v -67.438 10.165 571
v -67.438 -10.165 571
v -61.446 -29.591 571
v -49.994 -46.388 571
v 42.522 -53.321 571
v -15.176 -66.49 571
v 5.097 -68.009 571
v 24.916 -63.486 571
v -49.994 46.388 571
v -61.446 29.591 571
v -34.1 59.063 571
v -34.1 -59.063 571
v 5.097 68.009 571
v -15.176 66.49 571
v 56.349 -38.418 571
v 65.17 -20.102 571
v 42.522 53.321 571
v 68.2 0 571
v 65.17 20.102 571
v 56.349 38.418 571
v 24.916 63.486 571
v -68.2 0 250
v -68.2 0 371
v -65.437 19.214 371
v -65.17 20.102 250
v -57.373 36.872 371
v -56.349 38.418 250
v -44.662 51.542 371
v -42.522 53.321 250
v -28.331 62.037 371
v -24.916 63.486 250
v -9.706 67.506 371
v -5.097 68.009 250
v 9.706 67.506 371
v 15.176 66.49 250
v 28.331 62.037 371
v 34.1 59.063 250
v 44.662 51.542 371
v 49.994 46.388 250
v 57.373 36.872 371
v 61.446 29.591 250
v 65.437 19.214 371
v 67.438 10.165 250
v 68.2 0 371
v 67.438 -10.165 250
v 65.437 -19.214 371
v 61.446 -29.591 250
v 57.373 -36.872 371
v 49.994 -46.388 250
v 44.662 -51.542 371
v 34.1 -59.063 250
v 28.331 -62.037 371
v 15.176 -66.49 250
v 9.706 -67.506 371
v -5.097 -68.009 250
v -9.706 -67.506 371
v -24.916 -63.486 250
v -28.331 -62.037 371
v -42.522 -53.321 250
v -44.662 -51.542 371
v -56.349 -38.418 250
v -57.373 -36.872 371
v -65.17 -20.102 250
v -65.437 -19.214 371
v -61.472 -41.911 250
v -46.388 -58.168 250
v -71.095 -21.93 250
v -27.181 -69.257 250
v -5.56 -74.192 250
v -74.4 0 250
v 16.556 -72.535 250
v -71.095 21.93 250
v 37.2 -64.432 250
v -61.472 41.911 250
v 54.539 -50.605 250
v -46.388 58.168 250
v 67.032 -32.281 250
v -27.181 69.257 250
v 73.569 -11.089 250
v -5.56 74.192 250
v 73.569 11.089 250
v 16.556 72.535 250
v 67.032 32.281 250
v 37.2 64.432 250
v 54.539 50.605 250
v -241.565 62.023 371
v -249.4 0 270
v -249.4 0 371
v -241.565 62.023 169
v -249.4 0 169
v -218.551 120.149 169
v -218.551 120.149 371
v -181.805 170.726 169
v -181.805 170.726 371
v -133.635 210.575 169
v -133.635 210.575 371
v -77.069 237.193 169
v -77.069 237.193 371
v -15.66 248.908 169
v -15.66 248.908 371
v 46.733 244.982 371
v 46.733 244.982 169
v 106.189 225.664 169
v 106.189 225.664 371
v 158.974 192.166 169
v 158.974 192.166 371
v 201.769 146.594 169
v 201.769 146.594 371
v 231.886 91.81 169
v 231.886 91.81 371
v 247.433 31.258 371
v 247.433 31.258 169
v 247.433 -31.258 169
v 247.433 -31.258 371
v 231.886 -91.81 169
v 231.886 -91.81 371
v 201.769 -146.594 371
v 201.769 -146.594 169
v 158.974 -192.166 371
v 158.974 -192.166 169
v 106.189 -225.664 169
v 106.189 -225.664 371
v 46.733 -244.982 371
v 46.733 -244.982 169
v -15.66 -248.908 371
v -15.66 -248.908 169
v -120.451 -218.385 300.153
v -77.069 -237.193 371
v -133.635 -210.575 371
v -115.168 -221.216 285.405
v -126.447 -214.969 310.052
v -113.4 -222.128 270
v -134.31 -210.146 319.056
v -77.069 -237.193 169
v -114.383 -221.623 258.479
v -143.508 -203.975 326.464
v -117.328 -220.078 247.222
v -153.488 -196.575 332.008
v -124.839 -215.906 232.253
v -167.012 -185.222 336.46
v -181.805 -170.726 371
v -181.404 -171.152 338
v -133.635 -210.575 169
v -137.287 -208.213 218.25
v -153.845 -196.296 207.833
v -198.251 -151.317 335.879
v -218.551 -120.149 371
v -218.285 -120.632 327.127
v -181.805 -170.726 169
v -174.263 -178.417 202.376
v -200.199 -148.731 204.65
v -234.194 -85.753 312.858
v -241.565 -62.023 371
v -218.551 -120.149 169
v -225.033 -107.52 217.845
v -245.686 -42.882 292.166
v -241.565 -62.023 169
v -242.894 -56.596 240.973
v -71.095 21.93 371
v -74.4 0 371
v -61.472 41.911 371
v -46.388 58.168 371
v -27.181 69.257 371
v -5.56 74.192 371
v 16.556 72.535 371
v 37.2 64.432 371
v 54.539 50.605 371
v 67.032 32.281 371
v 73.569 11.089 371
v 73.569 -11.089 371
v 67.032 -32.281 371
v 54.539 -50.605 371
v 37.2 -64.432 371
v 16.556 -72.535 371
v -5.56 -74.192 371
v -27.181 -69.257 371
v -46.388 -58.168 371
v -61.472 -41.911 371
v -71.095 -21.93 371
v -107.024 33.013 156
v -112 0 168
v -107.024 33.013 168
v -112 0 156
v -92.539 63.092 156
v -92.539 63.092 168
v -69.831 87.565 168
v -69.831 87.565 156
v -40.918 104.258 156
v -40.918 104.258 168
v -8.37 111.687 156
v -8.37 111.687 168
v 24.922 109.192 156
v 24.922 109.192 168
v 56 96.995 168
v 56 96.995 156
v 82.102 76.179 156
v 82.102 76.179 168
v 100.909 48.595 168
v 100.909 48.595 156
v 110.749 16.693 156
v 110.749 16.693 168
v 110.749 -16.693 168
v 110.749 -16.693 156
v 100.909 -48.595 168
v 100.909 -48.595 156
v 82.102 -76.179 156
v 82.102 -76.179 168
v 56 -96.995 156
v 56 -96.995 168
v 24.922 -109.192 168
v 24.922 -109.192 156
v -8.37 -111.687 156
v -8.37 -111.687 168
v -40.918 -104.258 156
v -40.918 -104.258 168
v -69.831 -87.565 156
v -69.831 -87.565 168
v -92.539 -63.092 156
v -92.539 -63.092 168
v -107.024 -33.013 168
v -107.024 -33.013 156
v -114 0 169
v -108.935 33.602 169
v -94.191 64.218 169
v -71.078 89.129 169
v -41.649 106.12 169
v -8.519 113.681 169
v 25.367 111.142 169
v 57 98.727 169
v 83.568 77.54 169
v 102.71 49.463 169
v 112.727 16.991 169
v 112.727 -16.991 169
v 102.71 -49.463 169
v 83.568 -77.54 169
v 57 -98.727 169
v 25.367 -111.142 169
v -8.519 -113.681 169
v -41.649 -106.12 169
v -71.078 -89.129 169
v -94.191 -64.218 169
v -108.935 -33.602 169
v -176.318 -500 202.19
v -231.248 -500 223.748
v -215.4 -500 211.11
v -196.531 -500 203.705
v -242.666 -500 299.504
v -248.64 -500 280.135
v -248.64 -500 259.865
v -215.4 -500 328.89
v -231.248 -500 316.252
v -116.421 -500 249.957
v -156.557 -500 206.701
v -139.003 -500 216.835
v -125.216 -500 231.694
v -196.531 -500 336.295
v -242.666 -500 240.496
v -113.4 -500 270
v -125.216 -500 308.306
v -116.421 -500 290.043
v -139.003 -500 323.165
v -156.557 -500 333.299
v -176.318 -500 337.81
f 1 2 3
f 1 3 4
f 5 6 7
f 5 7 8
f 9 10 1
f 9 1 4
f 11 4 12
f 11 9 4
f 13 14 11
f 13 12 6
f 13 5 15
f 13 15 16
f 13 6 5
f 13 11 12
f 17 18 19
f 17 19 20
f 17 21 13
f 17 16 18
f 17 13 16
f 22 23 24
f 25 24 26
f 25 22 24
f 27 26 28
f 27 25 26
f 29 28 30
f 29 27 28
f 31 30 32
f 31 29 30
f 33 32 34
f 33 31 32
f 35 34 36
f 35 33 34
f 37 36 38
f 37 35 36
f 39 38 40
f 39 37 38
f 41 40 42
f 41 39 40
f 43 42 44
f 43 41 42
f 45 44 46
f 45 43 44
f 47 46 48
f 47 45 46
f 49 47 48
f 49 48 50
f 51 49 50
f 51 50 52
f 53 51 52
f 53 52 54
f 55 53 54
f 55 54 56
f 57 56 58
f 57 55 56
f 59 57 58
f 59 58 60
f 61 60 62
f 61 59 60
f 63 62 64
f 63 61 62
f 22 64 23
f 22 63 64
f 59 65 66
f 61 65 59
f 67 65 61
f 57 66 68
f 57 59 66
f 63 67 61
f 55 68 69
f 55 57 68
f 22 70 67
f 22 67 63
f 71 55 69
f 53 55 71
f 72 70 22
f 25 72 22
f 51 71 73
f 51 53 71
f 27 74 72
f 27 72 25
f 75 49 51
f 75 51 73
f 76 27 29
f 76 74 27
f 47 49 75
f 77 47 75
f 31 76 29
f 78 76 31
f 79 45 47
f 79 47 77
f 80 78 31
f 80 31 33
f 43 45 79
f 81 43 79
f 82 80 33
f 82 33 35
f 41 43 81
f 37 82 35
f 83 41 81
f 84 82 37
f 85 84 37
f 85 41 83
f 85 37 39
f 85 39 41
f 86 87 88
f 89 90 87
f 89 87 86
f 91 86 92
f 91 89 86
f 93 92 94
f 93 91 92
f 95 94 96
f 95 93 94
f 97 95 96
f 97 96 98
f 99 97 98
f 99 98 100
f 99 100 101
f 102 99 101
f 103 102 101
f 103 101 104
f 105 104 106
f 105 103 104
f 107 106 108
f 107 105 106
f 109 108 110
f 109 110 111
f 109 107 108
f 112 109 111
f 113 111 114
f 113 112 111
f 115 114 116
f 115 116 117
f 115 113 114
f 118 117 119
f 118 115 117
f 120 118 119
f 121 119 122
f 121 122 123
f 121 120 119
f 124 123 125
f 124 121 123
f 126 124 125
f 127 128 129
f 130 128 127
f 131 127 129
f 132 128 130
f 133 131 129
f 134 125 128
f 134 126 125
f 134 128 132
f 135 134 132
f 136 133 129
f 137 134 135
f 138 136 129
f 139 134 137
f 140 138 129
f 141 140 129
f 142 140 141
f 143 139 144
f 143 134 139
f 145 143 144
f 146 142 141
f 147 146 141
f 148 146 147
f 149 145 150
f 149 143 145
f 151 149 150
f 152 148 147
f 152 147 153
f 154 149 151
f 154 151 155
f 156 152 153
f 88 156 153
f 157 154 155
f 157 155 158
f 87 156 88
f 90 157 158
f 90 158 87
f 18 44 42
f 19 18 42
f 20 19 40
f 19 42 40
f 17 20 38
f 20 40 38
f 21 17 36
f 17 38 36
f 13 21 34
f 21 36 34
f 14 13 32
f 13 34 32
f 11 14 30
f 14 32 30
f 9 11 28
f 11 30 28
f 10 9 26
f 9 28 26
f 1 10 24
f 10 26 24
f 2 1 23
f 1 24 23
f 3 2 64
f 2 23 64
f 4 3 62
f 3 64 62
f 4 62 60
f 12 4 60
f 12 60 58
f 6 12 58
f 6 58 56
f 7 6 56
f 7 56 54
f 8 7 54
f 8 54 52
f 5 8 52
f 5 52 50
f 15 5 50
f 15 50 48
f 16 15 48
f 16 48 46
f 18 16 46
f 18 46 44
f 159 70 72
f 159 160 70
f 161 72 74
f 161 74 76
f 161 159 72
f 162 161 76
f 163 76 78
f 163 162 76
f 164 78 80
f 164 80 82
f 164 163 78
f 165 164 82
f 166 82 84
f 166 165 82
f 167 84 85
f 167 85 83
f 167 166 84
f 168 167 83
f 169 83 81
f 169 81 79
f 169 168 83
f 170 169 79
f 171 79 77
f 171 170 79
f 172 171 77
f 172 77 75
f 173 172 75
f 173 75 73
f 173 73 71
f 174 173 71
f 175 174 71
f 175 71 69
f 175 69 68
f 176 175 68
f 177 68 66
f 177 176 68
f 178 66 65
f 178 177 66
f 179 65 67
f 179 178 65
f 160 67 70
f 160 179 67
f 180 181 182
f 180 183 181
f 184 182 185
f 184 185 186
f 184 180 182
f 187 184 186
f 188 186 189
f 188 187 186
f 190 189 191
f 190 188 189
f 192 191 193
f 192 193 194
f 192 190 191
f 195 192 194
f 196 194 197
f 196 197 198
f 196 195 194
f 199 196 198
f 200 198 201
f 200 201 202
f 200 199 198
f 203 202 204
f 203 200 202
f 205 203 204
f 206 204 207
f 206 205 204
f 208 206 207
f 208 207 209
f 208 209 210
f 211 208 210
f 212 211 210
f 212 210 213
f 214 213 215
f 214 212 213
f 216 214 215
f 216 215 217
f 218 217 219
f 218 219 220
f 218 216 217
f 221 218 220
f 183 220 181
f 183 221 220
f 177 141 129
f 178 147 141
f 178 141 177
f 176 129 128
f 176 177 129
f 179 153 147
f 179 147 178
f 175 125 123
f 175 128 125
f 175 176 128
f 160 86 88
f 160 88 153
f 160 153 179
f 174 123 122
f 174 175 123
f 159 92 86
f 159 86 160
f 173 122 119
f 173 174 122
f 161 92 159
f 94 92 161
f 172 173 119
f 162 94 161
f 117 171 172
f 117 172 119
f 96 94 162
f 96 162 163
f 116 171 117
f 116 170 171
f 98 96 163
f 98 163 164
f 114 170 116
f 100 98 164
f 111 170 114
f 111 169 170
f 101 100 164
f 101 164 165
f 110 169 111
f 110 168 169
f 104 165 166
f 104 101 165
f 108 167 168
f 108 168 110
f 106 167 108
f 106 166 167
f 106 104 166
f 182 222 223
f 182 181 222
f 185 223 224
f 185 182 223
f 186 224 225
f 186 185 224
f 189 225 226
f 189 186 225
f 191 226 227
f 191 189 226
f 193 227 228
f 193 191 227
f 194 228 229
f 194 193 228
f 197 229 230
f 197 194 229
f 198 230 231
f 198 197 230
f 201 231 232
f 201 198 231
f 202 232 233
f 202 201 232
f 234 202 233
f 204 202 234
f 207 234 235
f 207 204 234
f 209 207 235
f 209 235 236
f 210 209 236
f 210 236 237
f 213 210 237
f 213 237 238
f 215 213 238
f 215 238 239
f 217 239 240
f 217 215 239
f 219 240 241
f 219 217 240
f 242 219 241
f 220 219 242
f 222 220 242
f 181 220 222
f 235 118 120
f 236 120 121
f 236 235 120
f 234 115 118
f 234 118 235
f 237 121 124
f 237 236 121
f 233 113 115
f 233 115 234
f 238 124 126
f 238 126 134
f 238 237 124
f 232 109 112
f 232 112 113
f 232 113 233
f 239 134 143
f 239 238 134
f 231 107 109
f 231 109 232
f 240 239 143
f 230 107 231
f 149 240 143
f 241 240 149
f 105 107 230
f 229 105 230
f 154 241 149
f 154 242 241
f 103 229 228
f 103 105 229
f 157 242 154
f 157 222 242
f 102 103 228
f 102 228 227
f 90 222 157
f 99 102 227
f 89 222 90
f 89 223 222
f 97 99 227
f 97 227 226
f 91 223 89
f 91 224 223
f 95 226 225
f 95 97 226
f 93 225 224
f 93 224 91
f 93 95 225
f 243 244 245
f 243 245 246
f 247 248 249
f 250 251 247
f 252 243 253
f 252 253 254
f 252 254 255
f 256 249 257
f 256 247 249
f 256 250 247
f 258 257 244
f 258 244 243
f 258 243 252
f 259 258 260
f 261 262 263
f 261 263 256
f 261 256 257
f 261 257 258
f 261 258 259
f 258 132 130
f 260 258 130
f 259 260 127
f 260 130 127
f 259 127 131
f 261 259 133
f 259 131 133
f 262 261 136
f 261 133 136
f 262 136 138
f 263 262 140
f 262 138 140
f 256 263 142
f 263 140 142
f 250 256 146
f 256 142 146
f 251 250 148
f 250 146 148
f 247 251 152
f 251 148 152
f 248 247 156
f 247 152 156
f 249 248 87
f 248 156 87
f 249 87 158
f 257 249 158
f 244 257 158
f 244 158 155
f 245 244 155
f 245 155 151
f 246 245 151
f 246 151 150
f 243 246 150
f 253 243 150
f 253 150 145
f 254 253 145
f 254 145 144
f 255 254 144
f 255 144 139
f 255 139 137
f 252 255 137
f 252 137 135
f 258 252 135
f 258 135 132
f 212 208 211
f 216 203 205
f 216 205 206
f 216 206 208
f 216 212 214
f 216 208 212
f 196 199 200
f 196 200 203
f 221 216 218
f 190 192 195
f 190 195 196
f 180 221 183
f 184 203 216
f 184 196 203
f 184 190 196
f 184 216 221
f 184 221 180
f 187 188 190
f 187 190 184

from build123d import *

# Parameters (mm, degrees)
F2_R      = 68
F3_DEPTH  = 500
F1_FACE_R = 68.2
F4_DEPTH  = 200


with BuildPart() as f1:
    # F0 (on Front) → F1 (revolve)
    with BuildSketch(Plane.XZ):
        Polygon((-249.4, 169), (-114, 169), (-112, 168), (-112, 156), (0, 156), (0, 371), (-68.2, 371), (-68.2, 250), (-74.4, 250), (-74.4, 371), (-249.4, 371), align=None)
    revolve(axis=Axis((0, 0, 263.5), (0, 0, -1)))

    # F2 (on Front) → F3 (join)
    with BuildSketch(Plane.XZ):
        with Locations((-181.4, 270)):
            Circle(F2_R)
    extrude(amount=F3_DEPTH)

    # F1_face (on face) → F4 (join)
    with BuildSketch(Plane.XY.offset(371)):
        Circle(F1_FACE_R)
    extrude(amount=F4_DEPTH)


solid = f1.part
